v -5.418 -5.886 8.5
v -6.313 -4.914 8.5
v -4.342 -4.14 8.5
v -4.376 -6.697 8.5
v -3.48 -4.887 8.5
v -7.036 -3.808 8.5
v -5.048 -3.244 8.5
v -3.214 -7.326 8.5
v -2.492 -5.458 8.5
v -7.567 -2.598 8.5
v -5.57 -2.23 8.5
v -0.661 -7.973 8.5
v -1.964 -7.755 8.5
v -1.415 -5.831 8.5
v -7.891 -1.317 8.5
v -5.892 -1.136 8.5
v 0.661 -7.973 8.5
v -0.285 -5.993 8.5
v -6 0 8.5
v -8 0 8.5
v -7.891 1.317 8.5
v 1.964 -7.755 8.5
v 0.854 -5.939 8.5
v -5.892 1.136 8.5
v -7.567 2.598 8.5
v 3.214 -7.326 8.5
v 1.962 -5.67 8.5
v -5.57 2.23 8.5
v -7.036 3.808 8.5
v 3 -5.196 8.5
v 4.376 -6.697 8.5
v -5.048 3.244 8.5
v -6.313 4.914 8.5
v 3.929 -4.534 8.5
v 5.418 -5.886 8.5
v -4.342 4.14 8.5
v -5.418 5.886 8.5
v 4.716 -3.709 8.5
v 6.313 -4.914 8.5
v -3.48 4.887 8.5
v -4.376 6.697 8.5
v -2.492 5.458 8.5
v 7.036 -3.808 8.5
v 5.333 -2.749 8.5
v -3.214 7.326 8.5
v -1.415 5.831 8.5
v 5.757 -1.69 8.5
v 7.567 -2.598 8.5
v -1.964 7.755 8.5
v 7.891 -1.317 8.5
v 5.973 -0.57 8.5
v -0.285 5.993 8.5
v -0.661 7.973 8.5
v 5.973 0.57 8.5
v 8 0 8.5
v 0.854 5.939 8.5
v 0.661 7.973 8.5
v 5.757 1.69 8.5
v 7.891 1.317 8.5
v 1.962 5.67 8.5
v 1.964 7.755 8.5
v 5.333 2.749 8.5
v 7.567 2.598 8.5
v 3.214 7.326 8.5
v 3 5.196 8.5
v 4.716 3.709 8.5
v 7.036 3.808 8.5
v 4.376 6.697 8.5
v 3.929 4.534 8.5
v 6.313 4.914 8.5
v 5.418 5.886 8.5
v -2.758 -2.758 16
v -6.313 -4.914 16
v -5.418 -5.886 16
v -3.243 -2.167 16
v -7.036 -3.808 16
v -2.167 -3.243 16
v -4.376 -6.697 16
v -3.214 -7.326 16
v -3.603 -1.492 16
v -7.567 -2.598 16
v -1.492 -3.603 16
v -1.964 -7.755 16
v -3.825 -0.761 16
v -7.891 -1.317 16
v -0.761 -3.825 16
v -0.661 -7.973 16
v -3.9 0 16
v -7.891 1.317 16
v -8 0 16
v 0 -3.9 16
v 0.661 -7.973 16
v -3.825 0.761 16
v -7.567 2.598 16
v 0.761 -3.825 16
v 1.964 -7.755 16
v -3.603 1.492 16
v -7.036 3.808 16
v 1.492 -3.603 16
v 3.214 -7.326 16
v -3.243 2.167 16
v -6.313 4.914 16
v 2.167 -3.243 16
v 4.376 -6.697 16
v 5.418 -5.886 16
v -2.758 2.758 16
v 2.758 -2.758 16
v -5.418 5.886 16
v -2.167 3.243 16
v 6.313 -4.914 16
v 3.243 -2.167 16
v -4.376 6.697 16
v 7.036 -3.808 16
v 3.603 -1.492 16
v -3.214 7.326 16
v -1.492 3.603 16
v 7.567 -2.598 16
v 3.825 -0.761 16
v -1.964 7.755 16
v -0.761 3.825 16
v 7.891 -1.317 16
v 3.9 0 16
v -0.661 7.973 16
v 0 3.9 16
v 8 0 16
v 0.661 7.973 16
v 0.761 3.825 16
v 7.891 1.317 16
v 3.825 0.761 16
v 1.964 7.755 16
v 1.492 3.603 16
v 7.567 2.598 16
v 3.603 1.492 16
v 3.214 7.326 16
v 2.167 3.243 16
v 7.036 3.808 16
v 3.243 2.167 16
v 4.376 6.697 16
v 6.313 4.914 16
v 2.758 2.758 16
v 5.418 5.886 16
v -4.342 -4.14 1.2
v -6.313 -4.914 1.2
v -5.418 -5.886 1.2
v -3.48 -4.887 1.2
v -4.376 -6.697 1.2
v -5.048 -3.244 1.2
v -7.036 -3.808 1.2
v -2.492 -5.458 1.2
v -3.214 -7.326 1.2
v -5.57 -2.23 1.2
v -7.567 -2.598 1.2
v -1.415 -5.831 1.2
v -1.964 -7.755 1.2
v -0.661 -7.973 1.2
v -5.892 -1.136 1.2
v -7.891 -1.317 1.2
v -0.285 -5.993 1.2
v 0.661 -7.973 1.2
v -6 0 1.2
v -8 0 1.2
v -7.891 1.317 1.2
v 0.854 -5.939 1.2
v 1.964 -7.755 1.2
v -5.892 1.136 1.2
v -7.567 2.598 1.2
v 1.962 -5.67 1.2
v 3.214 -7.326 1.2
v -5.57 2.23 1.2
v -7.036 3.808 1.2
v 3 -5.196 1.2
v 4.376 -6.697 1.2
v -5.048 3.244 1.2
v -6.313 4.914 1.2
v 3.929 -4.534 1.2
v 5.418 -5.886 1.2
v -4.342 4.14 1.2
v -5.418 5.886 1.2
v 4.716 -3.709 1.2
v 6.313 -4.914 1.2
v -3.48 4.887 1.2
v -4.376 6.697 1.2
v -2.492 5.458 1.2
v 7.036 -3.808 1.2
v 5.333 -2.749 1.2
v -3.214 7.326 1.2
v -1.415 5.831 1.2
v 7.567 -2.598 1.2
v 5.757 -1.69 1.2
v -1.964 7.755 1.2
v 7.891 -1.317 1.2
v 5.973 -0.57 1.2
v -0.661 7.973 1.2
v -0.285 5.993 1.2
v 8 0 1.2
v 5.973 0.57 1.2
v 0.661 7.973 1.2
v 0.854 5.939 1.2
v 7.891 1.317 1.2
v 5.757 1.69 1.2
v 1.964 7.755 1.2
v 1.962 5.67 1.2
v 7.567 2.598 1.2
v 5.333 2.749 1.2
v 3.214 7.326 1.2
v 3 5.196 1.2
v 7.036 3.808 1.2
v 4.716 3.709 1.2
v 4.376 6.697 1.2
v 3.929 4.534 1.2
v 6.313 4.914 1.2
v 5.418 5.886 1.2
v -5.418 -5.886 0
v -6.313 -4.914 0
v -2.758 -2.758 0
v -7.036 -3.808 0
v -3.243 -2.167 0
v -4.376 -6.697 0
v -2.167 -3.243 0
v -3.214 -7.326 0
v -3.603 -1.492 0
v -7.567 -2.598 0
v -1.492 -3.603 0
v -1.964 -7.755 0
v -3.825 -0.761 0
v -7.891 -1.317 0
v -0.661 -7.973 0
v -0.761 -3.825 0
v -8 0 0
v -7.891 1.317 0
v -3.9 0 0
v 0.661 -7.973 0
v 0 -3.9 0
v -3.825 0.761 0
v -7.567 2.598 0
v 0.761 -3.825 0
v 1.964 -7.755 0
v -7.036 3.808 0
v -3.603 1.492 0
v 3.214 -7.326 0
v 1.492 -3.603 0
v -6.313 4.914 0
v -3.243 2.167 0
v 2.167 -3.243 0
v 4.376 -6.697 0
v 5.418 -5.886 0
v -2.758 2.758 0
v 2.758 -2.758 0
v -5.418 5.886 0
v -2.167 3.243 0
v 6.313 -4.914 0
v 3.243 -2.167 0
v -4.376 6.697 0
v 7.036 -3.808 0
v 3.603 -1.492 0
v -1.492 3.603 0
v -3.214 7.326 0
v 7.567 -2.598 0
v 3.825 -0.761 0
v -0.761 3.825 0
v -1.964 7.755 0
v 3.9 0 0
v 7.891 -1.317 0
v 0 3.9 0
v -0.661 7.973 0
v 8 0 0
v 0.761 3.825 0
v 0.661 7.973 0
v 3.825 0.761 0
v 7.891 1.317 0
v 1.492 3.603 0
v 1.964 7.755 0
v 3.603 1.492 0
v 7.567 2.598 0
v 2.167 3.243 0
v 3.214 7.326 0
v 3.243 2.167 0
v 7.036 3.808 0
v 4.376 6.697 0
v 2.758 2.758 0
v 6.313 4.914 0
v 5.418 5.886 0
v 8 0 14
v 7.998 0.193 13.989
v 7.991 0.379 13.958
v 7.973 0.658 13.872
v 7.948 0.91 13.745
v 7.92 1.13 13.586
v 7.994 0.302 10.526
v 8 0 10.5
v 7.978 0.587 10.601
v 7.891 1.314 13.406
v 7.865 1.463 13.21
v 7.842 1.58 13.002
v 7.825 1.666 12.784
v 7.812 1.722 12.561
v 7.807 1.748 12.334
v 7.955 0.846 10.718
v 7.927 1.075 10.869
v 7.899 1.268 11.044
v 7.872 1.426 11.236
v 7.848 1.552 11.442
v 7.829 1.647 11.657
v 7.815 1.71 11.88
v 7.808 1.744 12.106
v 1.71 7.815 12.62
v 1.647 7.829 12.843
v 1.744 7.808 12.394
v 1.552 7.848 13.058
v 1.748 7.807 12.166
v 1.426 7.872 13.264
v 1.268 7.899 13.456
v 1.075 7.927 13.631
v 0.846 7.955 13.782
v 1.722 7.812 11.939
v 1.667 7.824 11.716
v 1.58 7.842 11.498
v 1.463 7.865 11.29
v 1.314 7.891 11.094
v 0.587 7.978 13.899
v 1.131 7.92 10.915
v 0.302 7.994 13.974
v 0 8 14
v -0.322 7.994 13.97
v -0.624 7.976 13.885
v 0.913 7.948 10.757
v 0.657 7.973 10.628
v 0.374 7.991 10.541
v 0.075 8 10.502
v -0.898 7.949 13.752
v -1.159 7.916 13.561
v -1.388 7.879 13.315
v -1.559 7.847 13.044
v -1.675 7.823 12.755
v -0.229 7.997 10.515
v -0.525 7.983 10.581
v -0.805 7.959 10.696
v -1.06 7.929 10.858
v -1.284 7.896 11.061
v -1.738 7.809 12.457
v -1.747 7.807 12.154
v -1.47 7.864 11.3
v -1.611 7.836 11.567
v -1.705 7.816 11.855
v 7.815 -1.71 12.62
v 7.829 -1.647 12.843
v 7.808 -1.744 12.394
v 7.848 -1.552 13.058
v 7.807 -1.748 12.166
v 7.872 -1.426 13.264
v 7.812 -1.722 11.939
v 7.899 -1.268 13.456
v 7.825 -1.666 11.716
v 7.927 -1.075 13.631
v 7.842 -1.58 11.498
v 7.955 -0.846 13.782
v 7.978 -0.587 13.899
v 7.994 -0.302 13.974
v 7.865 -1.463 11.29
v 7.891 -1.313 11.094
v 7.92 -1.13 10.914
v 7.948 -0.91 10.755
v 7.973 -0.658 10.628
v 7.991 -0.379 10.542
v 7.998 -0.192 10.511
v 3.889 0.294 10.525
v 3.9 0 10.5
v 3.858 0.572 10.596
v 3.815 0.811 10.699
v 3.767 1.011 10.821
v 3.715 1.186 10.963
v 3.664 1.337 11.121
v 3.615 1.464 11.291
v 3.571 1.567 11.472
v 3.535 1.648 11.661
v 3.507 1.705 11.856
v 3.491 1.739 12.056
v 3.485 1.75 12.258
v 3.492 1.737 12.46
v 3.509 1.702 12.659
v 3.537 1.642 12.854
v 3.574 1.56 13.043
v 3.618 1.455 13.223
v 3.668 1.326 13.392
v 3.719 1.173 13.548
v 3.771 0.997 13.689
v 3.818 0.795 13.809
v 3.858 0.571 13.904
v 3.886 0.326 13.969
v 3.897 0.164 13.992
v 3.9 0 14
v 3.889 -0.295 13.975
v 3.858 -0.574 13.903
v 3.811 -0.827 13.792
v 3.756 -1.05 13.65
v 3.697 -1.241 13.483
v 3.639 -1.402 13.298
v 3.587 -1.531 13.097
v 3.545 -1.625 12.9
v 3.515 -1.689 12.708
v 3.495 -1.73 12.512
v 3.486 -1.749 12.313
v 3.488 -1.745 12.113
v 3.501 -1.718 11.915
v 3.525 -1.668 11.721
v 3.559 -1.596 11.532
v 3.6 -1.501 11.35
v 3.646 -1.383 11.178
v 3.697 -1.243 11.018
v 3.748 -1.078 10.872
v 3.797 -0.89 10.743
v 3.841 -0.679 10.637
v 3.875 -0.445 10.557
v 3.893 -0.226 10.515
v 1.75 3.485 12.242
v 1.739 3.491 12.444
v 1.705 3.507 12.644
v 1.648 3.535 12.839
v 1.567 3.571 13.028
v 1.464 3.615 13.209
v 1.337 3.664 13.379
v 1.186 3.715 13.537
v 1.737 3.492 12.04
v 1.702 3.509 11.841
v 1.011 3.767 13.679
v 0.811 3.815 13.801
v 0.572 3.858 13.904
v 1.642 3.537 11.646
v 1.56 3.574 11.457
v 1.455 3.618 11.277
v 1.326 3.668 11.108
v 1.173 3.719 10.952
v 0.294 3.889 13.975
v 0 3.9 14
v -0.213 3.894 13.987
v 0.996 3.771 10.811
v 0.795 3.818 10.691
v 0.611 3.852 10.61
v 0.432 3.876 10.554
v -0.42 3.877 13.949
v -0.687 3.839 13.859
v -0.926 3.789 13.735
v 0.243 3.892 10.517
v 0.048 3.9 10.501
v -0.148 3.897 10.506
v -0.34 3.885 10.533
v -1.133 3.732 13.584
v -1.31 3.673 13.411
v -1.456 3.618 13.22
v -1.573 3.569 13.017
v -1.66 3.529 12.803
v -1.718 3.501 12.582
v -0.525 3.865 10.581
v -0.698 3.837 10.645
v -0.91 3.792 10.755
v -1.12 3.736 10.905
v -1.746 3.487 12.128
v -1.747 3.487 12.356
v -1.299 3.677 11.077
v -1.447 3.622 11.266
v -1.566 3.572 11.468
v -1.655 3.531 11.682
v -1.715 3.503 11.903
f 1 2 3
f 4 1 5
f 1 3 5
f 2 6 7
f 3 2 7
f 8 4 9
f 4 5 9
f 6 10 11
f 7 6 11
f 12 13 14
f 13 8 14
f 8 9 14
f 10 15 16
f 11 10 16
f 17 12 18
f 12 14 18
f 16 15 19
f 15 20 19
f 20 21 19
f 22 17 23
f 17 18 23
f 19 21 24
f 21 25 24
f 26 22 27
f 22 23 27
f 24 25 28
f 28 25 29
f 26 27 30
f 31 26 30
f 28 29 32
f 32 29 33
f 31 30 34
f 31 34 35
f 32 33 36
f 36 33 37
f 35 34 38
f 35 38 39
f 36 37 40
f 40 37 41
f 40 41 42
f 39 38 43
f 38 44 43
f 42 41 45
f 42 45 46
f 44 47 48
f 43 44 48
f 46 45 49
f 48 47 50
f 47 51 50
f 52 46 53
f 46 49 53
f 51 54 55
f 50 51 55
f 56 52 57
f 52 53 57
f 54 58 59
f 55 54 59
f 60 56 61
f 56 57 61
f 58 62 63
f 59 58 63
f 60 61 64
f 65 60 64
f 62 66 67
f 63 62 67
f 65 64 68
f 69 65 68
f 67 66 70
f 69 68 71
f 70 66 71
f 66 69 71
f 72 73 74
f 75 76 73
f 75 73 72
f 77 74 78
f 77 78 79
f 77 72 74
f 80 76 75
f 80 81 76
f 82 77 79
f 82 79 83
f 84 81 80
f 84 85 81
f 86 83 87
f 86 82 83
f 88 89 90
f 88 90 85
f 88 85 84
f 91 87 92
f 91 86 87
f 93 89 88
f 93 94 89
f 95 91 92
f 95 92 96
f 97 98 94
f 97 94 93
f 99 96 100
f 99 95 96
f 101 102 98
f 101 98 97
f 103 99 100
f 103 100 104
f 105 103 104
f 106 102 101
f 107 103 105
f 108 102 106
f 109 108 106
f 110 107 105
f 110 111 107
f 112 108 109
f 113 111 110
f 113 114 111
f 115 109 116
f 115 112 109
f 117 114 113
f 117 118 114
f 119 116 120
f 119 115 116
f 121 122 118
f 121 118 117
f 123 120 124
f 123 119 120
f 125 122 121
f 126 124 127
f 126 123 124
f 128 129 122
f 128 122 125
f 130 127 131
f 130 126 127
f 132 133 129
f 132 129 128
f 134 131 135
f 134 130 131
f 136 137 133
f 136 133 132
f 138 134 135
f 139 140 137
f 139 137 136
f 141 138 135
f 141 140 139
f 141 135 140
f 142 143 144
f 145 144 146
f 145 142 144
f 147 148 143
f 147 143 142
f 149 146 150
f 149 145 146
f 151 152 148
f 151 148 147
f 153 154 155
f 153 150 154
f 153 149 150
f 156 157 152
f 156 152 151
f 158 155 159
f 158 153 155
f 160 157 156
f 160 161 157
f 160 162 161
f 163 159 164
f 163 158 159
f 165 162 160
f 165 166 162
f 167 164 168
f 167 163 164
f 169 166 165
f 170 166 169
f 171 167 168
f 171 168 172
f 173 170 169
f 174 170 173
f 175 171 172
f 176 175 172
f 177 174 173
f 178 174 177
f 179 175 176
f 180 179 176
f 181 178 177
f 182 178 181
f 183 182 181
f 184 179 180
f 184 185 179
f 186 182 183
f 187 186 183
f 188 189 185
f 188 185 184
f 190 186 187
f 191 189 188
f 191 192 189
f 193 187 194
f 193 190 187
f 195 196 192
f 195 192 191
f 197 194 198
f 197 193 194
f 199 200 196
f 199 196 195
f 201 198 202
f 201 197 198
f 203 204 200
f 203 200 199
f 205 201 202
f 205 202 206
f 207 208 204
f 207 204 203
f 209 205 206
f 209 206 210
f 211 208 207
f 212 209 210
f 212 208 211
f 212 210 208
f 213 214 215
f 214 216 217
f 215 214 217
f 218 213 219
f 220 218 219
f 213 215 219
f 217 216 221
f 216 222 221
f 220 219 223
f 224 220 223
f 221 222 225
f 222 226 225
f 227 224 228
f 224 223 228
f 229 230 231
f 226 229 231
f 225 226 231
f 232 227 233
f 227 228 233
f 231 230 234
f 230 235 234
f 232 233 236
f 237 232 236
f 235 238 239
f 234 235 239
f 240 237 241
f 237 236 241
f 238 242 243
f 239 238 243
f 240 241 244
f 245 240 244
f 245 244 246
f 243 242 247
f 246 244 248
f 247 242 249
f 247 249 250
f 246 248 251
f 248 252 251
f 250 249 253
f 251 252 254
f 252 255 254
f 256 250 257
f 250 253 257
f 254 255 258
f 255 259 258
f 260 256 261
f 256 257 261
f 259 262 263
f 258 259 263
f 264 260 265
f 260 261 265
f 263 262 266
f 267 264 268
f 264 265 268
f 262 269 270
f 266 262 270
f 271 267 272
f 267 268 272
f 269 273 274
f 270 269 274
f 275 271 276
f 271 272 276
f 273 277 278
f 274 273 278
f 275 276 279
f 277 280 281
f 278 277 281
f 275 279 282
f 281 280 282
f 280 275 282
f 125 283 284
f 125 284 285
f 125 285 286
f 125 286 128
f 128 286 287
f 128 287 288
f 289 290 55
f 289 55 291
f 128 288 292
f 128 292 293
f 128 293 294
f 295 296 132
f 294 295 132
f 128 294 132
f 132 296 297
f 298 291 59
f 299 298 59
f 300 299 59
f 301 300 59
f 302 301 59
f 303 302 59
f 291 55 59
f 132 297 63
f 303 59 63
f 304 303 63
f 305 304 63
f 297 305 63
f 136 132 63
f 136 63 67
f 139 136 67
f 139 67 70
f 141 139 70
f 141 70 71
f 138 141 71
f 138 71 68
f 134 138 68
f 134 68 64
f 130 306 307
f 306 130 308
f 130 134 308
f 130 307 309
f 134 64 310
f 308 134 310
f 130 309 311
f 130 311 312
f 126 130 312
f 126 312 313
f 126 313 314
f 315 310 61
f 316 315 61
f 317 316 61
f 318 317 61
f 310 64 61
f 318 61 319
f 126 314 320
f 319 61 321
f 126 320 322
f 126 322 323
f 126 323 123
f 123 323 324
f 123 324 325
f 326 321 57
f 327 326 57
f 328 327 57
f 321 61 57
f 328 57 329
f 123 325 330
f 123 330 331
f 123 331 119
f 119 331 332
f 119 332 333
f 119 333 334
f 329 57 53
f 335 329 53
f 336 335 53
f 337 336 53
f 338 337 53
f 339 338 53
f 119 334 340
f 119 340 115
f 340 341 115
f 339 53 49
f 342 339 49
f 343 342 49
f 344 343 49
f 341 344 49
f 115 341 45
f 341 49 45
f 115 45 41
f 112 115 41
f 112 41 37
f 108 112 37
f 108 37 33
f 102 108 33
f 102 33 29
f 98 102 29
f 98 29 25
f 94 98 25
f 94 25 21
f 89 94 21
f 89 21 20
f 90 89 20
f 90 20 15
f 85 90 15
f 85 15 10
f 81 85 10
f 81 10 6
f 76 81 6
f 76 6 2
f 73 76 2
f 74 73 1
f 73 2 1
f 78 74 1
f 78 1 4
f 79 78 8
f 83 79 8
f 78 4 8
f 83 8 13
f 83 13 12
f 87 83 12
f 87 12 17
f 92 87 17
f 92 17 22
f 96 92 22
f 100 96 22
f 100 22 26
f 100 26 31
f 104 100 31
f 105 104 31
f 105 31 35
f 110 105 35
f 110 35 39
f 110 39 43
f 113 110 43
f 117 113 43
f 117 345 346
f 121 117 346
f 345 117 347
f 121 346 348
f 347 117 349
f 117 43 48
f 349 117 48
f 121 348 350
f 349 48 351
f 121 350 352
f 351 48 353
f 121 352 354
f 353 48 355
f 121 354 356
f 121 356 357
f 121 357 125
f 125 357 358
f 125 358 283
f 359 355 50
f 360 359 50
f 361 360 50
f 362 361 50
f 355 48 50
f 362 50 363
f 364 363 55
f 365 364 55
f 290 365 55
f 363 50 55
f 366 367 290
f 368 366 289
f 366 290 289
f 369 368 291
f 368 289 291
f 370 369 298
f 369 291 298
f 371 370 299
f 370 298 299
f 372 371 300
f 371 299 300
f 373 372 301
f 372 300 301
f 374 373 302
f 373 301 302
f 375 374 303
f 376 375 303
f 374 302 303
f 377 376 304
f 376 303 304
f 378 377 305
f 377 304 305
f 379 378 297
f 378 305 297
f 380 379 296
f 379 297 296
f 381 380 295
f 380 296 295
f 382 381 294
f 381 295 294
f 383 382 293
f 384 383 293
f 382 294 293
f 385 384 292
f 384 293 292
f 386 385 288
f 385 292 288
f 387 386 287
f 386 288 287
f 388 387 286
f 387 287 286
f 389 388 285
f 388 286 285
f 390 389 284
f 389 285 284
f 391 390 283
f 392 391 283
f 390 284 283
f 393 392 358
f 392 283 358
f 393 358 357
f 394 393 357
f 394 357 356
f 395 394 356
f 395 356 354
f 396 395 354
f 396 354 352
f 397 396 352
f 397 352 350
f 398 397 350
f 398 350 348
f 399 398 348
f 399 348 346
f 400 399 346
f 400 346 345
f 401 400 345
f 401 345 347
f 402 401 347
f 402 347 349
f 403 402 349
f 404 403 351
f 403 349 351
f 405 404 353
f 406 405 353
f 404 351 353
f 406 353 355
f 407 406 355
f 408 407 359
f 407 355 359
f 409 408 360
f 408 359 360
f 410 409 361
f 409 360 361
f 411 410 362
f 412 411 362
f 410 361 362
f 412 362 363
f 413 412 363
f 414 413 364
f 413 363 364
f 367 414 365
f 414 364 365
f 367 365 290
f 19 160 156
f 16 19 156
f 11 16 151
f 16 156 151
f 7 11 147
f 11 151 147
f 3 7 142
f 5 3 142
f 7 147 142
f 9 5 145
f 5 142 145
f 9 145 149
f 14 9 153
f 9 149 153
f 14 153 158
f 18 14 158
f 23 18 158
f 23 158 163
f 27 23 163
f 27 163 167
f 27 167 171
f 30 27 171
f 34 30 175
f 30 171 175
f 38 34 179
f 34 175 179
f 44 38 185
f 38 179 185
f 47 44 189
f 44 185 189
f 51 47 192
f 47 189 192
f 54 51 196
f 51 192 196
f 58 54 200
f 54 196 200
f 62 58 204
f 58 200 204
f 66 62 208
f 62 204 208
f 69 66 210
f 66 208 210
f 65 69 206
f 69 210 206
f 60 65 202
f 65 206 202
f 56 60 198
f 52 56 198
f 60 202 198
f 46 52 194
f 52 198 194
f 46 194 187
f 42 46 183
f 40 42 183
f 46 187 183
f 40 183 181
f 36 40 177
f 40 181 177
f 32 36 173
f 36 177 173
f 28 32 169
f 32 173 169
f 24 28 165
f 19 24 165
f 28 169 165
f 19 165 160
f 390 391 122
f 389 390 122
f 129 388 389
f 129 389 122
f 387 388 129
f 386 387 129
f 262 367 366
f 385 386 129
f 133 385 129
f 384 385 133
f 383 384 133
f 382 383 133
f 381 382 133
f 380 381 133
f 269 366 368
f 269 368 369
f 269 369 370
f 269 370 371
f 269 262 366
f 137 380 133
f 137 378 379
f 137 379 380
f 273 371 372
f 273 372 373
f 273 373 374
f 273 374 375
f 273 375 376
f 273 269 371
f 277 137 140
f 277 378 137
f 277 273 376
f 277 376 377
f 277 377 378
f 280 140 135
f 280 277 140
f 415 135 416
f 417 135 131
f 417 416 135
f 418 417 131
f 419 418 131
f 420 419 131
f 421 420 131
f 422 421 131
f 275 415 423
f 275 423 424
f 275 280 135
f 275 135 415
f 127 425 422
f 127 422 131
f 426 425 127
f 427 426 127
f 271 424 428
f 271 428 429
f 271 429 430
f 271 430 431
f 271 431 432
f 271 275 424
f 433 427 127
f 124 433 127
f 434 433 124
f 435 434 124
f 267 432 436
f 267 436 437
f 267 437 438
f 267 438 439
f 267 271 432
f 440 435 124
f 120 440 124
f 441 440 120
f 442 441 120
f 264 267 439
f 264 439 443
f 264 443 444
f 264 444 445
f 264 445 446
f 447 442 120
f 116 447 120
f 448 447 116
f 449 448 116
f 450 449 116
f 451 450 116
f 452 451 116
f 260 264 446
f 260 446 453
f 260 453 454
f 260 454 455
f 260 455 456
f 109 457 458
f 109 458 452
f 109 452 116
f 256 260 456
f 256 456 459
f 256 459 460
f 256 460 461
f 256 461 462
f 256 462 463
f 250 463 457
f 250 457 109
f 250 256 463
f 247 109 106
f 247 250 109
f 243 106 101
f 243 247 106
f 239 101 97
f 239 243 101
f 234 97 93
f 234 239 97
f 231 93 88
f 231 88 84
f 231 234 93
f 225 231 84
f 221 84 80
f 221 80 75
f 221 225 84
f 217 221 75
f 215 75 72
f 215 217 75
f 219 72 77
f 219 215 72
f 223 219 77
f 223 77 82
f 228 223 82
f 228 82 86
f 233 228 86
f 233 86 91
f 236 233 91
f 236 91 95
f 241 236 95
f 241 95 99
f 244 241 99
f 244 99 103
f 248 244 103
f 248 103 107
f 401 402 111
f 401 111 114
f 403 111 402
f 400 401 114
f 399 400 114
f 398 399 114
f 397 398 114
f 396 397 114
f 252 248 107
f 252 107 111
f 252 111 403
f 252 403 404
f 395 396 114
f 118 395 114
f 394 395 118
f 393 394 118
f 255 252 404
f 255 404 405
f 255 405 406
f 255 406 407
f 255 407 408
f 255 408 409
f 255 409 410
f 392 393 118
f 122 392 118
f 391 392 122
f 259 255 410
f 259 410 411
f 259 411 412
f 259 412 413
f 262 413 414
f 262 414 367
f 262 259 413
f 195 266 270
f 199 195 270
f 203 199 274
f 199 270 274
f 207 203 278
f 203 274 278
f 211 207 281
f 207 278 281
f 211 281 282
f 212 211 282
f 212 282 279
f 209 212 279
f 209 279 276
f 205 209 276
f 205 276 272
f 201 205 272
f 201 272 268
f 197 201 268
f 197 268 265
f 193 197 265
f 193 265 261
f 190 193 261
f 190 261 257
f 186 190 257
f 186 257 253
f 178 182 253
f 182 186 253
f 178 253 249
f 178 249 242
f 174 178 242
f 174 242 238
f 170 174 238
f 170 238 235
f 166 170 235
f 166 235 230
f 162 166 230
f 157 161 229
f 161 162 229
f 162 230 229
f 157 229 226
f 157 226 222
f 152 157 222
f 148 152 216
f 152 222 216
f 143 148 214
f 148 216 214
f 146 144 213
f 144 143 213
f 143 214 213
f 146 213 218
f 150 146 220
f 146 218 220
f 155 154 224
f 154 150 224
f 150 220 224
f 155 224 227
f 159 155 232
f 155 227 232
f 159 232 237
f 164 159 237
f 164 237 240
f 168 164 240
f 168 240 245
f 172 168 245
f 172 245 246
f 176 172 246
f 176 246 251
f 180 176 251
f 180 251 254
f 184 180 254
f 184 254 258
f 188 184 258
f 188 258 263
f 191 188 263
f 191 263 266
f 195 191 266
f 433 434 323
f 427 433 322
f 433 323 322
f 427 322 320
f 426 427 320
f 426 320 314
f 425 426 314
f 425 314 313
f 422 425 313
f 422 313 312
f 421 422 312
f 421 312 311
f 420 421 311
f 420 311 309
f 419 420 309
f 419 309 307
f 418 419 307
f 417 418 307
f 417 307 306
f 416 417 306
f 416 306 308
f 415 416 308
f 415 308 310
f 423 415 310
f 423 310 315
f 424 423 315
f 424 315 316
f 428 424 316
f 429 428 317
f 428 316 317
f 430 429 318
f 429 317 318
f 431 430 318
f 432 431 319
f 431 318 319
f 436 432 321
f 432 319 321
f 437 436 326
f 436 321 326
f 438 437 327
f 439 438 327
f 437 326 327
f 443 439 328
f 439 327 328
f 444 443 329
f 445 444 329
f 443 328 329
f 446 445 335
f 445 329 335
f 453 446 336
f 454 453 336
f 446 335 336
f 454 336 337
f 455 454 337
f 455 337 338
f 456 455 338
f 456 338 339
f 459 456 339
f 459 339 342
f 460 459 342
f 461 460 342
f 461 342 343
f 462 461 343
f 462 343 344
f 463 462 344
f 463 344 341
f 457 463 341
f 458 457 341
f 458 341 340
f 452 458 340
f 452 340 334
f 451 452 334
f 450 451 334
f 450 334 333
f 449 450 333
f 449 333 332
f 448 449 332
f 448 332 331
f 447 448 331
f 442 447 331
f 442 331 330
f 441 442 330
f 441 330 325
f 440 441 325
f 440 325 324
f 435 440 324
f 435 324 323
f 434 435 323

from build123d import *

# Parameters (mm, degrees)
SKETCH2_R               = 8
SKETCH2_R_2             = 3.9
BOSS_EXTRUDE1_DEPTH     = 16
SKETCH3_OUTSIDE_W       = 23.542
SKETCH3_OUTSIDE_H       = 23.542
SKETCH3_OUTSIDE_R       = 6
CUT_EXTRUDE1_DEPTH      = 7.3
CUT_EXTRUDE2_REACH      = 26
CUT_EXTRUDE2_END_RADIUS = 3.9
SKETCH6_R               = 1.75
CUT_EXTRUDE3_REACH      = 26
CUT_EXTRUDE3_END_RADIUS = 3.9
SKETCH5_R               = 1.75


with BuildPart() as part:
    # Sketch2 → Boss-Extrude1 (new body)
    with BuildSketch(Plane.XY):
        Circle(SKETCH2_R)
        Circle(SKETCH2_R_2, mode=Mode.SUBTRACT)
    extrude(amount=BOSS_EXTRUDE1_DEPTH)

    # Sketch3 outside → Cut-Extrude1 (cut)
    with BuildSketch(Plane.XY.offset(1.2)):
        Rectangle(SKETCH3_OUTSIDE_W, SKETCH3_OUTSIDE_H)
        with Locations(Location((0, 0, 0), (0, 0, 180))):
            Circle(SKETCH3_OUTSIDE_R, mode=Mode.SUBTRACT)
    extrude(amount=CUT_EXTRUDE1_DEPTH, mode=Mode.SUBTRACT)

    # Cut-Extrude2: up to this cylinder (the profile starts outside it)
    cut_extrude2_end = Plane(origin=(0, 0, 12.25), z_dir=(0, 0, -1)) * Cylinder(CUT_EXTRUDE2_END_RADIUS, 60.8, mode=Mode.PRIVATE)
    # Sketch6 → Cut-Extrude2 (cut, up to the surface)
    with BuildSketch(Plane(origin=(8, 0, 0), x_dir=(0, 0, -1), z_dir=(1, 0, 0)), mode=Mode.PRIVATE) as cut_extrude2_sk1:
        with Locations((-12.25, 0)):
            Circle(SKETCH6_R)
    cut_extrude2_tool1 = extrude(cut_extrude2_sk1.sketch, amount=-CUT_EXTRUDE2_REACH, mode=Mode.PRIVATE) - cut_extrude2_end
    add(cut_extrude2_tool1.solids().sort_by_distance((8, 0, 12.25))[0], mode=Mode.SUBTRACT)

    # Cut-Extrude3: up to this cylinder (the profile starts outside it)
    cut_extrude3_end = Plane(origin=(0, 0, 12.25), z_dir=(0, 0, -1)) * Cylinder(CUT_EXTRUDE3_END_RADIUS, 60.8, mode=Mode.PRIVATE)
    # Sketch5 → Cut-Extrude3 (cut, up to the surface)
    with BuildSketch(Plane(origin=(0, 8, 0), x_dir=(1, 0, 0), z_dir=(0, 1, 0)), mode=Mode.PRIVATE) as cut_extrude3_sk1:
        with Locations(Location((0, -12.25, 0), (0, 0, 270))):
            Circle(SKETCH5_R)
    cut_extrude3_tool1 = extrude(cut_extrude3_sk1.sketch, amount=-CUT_EXTRUDE3_REACH, mode=Mode.PRIVATE) - cut_extrude3_end
    add(cut_extrude3_tool1.solids().sort_by_distance((0, 8, 12.25))[0], mode=Mode.SUBTRACT)


solid = part.part
